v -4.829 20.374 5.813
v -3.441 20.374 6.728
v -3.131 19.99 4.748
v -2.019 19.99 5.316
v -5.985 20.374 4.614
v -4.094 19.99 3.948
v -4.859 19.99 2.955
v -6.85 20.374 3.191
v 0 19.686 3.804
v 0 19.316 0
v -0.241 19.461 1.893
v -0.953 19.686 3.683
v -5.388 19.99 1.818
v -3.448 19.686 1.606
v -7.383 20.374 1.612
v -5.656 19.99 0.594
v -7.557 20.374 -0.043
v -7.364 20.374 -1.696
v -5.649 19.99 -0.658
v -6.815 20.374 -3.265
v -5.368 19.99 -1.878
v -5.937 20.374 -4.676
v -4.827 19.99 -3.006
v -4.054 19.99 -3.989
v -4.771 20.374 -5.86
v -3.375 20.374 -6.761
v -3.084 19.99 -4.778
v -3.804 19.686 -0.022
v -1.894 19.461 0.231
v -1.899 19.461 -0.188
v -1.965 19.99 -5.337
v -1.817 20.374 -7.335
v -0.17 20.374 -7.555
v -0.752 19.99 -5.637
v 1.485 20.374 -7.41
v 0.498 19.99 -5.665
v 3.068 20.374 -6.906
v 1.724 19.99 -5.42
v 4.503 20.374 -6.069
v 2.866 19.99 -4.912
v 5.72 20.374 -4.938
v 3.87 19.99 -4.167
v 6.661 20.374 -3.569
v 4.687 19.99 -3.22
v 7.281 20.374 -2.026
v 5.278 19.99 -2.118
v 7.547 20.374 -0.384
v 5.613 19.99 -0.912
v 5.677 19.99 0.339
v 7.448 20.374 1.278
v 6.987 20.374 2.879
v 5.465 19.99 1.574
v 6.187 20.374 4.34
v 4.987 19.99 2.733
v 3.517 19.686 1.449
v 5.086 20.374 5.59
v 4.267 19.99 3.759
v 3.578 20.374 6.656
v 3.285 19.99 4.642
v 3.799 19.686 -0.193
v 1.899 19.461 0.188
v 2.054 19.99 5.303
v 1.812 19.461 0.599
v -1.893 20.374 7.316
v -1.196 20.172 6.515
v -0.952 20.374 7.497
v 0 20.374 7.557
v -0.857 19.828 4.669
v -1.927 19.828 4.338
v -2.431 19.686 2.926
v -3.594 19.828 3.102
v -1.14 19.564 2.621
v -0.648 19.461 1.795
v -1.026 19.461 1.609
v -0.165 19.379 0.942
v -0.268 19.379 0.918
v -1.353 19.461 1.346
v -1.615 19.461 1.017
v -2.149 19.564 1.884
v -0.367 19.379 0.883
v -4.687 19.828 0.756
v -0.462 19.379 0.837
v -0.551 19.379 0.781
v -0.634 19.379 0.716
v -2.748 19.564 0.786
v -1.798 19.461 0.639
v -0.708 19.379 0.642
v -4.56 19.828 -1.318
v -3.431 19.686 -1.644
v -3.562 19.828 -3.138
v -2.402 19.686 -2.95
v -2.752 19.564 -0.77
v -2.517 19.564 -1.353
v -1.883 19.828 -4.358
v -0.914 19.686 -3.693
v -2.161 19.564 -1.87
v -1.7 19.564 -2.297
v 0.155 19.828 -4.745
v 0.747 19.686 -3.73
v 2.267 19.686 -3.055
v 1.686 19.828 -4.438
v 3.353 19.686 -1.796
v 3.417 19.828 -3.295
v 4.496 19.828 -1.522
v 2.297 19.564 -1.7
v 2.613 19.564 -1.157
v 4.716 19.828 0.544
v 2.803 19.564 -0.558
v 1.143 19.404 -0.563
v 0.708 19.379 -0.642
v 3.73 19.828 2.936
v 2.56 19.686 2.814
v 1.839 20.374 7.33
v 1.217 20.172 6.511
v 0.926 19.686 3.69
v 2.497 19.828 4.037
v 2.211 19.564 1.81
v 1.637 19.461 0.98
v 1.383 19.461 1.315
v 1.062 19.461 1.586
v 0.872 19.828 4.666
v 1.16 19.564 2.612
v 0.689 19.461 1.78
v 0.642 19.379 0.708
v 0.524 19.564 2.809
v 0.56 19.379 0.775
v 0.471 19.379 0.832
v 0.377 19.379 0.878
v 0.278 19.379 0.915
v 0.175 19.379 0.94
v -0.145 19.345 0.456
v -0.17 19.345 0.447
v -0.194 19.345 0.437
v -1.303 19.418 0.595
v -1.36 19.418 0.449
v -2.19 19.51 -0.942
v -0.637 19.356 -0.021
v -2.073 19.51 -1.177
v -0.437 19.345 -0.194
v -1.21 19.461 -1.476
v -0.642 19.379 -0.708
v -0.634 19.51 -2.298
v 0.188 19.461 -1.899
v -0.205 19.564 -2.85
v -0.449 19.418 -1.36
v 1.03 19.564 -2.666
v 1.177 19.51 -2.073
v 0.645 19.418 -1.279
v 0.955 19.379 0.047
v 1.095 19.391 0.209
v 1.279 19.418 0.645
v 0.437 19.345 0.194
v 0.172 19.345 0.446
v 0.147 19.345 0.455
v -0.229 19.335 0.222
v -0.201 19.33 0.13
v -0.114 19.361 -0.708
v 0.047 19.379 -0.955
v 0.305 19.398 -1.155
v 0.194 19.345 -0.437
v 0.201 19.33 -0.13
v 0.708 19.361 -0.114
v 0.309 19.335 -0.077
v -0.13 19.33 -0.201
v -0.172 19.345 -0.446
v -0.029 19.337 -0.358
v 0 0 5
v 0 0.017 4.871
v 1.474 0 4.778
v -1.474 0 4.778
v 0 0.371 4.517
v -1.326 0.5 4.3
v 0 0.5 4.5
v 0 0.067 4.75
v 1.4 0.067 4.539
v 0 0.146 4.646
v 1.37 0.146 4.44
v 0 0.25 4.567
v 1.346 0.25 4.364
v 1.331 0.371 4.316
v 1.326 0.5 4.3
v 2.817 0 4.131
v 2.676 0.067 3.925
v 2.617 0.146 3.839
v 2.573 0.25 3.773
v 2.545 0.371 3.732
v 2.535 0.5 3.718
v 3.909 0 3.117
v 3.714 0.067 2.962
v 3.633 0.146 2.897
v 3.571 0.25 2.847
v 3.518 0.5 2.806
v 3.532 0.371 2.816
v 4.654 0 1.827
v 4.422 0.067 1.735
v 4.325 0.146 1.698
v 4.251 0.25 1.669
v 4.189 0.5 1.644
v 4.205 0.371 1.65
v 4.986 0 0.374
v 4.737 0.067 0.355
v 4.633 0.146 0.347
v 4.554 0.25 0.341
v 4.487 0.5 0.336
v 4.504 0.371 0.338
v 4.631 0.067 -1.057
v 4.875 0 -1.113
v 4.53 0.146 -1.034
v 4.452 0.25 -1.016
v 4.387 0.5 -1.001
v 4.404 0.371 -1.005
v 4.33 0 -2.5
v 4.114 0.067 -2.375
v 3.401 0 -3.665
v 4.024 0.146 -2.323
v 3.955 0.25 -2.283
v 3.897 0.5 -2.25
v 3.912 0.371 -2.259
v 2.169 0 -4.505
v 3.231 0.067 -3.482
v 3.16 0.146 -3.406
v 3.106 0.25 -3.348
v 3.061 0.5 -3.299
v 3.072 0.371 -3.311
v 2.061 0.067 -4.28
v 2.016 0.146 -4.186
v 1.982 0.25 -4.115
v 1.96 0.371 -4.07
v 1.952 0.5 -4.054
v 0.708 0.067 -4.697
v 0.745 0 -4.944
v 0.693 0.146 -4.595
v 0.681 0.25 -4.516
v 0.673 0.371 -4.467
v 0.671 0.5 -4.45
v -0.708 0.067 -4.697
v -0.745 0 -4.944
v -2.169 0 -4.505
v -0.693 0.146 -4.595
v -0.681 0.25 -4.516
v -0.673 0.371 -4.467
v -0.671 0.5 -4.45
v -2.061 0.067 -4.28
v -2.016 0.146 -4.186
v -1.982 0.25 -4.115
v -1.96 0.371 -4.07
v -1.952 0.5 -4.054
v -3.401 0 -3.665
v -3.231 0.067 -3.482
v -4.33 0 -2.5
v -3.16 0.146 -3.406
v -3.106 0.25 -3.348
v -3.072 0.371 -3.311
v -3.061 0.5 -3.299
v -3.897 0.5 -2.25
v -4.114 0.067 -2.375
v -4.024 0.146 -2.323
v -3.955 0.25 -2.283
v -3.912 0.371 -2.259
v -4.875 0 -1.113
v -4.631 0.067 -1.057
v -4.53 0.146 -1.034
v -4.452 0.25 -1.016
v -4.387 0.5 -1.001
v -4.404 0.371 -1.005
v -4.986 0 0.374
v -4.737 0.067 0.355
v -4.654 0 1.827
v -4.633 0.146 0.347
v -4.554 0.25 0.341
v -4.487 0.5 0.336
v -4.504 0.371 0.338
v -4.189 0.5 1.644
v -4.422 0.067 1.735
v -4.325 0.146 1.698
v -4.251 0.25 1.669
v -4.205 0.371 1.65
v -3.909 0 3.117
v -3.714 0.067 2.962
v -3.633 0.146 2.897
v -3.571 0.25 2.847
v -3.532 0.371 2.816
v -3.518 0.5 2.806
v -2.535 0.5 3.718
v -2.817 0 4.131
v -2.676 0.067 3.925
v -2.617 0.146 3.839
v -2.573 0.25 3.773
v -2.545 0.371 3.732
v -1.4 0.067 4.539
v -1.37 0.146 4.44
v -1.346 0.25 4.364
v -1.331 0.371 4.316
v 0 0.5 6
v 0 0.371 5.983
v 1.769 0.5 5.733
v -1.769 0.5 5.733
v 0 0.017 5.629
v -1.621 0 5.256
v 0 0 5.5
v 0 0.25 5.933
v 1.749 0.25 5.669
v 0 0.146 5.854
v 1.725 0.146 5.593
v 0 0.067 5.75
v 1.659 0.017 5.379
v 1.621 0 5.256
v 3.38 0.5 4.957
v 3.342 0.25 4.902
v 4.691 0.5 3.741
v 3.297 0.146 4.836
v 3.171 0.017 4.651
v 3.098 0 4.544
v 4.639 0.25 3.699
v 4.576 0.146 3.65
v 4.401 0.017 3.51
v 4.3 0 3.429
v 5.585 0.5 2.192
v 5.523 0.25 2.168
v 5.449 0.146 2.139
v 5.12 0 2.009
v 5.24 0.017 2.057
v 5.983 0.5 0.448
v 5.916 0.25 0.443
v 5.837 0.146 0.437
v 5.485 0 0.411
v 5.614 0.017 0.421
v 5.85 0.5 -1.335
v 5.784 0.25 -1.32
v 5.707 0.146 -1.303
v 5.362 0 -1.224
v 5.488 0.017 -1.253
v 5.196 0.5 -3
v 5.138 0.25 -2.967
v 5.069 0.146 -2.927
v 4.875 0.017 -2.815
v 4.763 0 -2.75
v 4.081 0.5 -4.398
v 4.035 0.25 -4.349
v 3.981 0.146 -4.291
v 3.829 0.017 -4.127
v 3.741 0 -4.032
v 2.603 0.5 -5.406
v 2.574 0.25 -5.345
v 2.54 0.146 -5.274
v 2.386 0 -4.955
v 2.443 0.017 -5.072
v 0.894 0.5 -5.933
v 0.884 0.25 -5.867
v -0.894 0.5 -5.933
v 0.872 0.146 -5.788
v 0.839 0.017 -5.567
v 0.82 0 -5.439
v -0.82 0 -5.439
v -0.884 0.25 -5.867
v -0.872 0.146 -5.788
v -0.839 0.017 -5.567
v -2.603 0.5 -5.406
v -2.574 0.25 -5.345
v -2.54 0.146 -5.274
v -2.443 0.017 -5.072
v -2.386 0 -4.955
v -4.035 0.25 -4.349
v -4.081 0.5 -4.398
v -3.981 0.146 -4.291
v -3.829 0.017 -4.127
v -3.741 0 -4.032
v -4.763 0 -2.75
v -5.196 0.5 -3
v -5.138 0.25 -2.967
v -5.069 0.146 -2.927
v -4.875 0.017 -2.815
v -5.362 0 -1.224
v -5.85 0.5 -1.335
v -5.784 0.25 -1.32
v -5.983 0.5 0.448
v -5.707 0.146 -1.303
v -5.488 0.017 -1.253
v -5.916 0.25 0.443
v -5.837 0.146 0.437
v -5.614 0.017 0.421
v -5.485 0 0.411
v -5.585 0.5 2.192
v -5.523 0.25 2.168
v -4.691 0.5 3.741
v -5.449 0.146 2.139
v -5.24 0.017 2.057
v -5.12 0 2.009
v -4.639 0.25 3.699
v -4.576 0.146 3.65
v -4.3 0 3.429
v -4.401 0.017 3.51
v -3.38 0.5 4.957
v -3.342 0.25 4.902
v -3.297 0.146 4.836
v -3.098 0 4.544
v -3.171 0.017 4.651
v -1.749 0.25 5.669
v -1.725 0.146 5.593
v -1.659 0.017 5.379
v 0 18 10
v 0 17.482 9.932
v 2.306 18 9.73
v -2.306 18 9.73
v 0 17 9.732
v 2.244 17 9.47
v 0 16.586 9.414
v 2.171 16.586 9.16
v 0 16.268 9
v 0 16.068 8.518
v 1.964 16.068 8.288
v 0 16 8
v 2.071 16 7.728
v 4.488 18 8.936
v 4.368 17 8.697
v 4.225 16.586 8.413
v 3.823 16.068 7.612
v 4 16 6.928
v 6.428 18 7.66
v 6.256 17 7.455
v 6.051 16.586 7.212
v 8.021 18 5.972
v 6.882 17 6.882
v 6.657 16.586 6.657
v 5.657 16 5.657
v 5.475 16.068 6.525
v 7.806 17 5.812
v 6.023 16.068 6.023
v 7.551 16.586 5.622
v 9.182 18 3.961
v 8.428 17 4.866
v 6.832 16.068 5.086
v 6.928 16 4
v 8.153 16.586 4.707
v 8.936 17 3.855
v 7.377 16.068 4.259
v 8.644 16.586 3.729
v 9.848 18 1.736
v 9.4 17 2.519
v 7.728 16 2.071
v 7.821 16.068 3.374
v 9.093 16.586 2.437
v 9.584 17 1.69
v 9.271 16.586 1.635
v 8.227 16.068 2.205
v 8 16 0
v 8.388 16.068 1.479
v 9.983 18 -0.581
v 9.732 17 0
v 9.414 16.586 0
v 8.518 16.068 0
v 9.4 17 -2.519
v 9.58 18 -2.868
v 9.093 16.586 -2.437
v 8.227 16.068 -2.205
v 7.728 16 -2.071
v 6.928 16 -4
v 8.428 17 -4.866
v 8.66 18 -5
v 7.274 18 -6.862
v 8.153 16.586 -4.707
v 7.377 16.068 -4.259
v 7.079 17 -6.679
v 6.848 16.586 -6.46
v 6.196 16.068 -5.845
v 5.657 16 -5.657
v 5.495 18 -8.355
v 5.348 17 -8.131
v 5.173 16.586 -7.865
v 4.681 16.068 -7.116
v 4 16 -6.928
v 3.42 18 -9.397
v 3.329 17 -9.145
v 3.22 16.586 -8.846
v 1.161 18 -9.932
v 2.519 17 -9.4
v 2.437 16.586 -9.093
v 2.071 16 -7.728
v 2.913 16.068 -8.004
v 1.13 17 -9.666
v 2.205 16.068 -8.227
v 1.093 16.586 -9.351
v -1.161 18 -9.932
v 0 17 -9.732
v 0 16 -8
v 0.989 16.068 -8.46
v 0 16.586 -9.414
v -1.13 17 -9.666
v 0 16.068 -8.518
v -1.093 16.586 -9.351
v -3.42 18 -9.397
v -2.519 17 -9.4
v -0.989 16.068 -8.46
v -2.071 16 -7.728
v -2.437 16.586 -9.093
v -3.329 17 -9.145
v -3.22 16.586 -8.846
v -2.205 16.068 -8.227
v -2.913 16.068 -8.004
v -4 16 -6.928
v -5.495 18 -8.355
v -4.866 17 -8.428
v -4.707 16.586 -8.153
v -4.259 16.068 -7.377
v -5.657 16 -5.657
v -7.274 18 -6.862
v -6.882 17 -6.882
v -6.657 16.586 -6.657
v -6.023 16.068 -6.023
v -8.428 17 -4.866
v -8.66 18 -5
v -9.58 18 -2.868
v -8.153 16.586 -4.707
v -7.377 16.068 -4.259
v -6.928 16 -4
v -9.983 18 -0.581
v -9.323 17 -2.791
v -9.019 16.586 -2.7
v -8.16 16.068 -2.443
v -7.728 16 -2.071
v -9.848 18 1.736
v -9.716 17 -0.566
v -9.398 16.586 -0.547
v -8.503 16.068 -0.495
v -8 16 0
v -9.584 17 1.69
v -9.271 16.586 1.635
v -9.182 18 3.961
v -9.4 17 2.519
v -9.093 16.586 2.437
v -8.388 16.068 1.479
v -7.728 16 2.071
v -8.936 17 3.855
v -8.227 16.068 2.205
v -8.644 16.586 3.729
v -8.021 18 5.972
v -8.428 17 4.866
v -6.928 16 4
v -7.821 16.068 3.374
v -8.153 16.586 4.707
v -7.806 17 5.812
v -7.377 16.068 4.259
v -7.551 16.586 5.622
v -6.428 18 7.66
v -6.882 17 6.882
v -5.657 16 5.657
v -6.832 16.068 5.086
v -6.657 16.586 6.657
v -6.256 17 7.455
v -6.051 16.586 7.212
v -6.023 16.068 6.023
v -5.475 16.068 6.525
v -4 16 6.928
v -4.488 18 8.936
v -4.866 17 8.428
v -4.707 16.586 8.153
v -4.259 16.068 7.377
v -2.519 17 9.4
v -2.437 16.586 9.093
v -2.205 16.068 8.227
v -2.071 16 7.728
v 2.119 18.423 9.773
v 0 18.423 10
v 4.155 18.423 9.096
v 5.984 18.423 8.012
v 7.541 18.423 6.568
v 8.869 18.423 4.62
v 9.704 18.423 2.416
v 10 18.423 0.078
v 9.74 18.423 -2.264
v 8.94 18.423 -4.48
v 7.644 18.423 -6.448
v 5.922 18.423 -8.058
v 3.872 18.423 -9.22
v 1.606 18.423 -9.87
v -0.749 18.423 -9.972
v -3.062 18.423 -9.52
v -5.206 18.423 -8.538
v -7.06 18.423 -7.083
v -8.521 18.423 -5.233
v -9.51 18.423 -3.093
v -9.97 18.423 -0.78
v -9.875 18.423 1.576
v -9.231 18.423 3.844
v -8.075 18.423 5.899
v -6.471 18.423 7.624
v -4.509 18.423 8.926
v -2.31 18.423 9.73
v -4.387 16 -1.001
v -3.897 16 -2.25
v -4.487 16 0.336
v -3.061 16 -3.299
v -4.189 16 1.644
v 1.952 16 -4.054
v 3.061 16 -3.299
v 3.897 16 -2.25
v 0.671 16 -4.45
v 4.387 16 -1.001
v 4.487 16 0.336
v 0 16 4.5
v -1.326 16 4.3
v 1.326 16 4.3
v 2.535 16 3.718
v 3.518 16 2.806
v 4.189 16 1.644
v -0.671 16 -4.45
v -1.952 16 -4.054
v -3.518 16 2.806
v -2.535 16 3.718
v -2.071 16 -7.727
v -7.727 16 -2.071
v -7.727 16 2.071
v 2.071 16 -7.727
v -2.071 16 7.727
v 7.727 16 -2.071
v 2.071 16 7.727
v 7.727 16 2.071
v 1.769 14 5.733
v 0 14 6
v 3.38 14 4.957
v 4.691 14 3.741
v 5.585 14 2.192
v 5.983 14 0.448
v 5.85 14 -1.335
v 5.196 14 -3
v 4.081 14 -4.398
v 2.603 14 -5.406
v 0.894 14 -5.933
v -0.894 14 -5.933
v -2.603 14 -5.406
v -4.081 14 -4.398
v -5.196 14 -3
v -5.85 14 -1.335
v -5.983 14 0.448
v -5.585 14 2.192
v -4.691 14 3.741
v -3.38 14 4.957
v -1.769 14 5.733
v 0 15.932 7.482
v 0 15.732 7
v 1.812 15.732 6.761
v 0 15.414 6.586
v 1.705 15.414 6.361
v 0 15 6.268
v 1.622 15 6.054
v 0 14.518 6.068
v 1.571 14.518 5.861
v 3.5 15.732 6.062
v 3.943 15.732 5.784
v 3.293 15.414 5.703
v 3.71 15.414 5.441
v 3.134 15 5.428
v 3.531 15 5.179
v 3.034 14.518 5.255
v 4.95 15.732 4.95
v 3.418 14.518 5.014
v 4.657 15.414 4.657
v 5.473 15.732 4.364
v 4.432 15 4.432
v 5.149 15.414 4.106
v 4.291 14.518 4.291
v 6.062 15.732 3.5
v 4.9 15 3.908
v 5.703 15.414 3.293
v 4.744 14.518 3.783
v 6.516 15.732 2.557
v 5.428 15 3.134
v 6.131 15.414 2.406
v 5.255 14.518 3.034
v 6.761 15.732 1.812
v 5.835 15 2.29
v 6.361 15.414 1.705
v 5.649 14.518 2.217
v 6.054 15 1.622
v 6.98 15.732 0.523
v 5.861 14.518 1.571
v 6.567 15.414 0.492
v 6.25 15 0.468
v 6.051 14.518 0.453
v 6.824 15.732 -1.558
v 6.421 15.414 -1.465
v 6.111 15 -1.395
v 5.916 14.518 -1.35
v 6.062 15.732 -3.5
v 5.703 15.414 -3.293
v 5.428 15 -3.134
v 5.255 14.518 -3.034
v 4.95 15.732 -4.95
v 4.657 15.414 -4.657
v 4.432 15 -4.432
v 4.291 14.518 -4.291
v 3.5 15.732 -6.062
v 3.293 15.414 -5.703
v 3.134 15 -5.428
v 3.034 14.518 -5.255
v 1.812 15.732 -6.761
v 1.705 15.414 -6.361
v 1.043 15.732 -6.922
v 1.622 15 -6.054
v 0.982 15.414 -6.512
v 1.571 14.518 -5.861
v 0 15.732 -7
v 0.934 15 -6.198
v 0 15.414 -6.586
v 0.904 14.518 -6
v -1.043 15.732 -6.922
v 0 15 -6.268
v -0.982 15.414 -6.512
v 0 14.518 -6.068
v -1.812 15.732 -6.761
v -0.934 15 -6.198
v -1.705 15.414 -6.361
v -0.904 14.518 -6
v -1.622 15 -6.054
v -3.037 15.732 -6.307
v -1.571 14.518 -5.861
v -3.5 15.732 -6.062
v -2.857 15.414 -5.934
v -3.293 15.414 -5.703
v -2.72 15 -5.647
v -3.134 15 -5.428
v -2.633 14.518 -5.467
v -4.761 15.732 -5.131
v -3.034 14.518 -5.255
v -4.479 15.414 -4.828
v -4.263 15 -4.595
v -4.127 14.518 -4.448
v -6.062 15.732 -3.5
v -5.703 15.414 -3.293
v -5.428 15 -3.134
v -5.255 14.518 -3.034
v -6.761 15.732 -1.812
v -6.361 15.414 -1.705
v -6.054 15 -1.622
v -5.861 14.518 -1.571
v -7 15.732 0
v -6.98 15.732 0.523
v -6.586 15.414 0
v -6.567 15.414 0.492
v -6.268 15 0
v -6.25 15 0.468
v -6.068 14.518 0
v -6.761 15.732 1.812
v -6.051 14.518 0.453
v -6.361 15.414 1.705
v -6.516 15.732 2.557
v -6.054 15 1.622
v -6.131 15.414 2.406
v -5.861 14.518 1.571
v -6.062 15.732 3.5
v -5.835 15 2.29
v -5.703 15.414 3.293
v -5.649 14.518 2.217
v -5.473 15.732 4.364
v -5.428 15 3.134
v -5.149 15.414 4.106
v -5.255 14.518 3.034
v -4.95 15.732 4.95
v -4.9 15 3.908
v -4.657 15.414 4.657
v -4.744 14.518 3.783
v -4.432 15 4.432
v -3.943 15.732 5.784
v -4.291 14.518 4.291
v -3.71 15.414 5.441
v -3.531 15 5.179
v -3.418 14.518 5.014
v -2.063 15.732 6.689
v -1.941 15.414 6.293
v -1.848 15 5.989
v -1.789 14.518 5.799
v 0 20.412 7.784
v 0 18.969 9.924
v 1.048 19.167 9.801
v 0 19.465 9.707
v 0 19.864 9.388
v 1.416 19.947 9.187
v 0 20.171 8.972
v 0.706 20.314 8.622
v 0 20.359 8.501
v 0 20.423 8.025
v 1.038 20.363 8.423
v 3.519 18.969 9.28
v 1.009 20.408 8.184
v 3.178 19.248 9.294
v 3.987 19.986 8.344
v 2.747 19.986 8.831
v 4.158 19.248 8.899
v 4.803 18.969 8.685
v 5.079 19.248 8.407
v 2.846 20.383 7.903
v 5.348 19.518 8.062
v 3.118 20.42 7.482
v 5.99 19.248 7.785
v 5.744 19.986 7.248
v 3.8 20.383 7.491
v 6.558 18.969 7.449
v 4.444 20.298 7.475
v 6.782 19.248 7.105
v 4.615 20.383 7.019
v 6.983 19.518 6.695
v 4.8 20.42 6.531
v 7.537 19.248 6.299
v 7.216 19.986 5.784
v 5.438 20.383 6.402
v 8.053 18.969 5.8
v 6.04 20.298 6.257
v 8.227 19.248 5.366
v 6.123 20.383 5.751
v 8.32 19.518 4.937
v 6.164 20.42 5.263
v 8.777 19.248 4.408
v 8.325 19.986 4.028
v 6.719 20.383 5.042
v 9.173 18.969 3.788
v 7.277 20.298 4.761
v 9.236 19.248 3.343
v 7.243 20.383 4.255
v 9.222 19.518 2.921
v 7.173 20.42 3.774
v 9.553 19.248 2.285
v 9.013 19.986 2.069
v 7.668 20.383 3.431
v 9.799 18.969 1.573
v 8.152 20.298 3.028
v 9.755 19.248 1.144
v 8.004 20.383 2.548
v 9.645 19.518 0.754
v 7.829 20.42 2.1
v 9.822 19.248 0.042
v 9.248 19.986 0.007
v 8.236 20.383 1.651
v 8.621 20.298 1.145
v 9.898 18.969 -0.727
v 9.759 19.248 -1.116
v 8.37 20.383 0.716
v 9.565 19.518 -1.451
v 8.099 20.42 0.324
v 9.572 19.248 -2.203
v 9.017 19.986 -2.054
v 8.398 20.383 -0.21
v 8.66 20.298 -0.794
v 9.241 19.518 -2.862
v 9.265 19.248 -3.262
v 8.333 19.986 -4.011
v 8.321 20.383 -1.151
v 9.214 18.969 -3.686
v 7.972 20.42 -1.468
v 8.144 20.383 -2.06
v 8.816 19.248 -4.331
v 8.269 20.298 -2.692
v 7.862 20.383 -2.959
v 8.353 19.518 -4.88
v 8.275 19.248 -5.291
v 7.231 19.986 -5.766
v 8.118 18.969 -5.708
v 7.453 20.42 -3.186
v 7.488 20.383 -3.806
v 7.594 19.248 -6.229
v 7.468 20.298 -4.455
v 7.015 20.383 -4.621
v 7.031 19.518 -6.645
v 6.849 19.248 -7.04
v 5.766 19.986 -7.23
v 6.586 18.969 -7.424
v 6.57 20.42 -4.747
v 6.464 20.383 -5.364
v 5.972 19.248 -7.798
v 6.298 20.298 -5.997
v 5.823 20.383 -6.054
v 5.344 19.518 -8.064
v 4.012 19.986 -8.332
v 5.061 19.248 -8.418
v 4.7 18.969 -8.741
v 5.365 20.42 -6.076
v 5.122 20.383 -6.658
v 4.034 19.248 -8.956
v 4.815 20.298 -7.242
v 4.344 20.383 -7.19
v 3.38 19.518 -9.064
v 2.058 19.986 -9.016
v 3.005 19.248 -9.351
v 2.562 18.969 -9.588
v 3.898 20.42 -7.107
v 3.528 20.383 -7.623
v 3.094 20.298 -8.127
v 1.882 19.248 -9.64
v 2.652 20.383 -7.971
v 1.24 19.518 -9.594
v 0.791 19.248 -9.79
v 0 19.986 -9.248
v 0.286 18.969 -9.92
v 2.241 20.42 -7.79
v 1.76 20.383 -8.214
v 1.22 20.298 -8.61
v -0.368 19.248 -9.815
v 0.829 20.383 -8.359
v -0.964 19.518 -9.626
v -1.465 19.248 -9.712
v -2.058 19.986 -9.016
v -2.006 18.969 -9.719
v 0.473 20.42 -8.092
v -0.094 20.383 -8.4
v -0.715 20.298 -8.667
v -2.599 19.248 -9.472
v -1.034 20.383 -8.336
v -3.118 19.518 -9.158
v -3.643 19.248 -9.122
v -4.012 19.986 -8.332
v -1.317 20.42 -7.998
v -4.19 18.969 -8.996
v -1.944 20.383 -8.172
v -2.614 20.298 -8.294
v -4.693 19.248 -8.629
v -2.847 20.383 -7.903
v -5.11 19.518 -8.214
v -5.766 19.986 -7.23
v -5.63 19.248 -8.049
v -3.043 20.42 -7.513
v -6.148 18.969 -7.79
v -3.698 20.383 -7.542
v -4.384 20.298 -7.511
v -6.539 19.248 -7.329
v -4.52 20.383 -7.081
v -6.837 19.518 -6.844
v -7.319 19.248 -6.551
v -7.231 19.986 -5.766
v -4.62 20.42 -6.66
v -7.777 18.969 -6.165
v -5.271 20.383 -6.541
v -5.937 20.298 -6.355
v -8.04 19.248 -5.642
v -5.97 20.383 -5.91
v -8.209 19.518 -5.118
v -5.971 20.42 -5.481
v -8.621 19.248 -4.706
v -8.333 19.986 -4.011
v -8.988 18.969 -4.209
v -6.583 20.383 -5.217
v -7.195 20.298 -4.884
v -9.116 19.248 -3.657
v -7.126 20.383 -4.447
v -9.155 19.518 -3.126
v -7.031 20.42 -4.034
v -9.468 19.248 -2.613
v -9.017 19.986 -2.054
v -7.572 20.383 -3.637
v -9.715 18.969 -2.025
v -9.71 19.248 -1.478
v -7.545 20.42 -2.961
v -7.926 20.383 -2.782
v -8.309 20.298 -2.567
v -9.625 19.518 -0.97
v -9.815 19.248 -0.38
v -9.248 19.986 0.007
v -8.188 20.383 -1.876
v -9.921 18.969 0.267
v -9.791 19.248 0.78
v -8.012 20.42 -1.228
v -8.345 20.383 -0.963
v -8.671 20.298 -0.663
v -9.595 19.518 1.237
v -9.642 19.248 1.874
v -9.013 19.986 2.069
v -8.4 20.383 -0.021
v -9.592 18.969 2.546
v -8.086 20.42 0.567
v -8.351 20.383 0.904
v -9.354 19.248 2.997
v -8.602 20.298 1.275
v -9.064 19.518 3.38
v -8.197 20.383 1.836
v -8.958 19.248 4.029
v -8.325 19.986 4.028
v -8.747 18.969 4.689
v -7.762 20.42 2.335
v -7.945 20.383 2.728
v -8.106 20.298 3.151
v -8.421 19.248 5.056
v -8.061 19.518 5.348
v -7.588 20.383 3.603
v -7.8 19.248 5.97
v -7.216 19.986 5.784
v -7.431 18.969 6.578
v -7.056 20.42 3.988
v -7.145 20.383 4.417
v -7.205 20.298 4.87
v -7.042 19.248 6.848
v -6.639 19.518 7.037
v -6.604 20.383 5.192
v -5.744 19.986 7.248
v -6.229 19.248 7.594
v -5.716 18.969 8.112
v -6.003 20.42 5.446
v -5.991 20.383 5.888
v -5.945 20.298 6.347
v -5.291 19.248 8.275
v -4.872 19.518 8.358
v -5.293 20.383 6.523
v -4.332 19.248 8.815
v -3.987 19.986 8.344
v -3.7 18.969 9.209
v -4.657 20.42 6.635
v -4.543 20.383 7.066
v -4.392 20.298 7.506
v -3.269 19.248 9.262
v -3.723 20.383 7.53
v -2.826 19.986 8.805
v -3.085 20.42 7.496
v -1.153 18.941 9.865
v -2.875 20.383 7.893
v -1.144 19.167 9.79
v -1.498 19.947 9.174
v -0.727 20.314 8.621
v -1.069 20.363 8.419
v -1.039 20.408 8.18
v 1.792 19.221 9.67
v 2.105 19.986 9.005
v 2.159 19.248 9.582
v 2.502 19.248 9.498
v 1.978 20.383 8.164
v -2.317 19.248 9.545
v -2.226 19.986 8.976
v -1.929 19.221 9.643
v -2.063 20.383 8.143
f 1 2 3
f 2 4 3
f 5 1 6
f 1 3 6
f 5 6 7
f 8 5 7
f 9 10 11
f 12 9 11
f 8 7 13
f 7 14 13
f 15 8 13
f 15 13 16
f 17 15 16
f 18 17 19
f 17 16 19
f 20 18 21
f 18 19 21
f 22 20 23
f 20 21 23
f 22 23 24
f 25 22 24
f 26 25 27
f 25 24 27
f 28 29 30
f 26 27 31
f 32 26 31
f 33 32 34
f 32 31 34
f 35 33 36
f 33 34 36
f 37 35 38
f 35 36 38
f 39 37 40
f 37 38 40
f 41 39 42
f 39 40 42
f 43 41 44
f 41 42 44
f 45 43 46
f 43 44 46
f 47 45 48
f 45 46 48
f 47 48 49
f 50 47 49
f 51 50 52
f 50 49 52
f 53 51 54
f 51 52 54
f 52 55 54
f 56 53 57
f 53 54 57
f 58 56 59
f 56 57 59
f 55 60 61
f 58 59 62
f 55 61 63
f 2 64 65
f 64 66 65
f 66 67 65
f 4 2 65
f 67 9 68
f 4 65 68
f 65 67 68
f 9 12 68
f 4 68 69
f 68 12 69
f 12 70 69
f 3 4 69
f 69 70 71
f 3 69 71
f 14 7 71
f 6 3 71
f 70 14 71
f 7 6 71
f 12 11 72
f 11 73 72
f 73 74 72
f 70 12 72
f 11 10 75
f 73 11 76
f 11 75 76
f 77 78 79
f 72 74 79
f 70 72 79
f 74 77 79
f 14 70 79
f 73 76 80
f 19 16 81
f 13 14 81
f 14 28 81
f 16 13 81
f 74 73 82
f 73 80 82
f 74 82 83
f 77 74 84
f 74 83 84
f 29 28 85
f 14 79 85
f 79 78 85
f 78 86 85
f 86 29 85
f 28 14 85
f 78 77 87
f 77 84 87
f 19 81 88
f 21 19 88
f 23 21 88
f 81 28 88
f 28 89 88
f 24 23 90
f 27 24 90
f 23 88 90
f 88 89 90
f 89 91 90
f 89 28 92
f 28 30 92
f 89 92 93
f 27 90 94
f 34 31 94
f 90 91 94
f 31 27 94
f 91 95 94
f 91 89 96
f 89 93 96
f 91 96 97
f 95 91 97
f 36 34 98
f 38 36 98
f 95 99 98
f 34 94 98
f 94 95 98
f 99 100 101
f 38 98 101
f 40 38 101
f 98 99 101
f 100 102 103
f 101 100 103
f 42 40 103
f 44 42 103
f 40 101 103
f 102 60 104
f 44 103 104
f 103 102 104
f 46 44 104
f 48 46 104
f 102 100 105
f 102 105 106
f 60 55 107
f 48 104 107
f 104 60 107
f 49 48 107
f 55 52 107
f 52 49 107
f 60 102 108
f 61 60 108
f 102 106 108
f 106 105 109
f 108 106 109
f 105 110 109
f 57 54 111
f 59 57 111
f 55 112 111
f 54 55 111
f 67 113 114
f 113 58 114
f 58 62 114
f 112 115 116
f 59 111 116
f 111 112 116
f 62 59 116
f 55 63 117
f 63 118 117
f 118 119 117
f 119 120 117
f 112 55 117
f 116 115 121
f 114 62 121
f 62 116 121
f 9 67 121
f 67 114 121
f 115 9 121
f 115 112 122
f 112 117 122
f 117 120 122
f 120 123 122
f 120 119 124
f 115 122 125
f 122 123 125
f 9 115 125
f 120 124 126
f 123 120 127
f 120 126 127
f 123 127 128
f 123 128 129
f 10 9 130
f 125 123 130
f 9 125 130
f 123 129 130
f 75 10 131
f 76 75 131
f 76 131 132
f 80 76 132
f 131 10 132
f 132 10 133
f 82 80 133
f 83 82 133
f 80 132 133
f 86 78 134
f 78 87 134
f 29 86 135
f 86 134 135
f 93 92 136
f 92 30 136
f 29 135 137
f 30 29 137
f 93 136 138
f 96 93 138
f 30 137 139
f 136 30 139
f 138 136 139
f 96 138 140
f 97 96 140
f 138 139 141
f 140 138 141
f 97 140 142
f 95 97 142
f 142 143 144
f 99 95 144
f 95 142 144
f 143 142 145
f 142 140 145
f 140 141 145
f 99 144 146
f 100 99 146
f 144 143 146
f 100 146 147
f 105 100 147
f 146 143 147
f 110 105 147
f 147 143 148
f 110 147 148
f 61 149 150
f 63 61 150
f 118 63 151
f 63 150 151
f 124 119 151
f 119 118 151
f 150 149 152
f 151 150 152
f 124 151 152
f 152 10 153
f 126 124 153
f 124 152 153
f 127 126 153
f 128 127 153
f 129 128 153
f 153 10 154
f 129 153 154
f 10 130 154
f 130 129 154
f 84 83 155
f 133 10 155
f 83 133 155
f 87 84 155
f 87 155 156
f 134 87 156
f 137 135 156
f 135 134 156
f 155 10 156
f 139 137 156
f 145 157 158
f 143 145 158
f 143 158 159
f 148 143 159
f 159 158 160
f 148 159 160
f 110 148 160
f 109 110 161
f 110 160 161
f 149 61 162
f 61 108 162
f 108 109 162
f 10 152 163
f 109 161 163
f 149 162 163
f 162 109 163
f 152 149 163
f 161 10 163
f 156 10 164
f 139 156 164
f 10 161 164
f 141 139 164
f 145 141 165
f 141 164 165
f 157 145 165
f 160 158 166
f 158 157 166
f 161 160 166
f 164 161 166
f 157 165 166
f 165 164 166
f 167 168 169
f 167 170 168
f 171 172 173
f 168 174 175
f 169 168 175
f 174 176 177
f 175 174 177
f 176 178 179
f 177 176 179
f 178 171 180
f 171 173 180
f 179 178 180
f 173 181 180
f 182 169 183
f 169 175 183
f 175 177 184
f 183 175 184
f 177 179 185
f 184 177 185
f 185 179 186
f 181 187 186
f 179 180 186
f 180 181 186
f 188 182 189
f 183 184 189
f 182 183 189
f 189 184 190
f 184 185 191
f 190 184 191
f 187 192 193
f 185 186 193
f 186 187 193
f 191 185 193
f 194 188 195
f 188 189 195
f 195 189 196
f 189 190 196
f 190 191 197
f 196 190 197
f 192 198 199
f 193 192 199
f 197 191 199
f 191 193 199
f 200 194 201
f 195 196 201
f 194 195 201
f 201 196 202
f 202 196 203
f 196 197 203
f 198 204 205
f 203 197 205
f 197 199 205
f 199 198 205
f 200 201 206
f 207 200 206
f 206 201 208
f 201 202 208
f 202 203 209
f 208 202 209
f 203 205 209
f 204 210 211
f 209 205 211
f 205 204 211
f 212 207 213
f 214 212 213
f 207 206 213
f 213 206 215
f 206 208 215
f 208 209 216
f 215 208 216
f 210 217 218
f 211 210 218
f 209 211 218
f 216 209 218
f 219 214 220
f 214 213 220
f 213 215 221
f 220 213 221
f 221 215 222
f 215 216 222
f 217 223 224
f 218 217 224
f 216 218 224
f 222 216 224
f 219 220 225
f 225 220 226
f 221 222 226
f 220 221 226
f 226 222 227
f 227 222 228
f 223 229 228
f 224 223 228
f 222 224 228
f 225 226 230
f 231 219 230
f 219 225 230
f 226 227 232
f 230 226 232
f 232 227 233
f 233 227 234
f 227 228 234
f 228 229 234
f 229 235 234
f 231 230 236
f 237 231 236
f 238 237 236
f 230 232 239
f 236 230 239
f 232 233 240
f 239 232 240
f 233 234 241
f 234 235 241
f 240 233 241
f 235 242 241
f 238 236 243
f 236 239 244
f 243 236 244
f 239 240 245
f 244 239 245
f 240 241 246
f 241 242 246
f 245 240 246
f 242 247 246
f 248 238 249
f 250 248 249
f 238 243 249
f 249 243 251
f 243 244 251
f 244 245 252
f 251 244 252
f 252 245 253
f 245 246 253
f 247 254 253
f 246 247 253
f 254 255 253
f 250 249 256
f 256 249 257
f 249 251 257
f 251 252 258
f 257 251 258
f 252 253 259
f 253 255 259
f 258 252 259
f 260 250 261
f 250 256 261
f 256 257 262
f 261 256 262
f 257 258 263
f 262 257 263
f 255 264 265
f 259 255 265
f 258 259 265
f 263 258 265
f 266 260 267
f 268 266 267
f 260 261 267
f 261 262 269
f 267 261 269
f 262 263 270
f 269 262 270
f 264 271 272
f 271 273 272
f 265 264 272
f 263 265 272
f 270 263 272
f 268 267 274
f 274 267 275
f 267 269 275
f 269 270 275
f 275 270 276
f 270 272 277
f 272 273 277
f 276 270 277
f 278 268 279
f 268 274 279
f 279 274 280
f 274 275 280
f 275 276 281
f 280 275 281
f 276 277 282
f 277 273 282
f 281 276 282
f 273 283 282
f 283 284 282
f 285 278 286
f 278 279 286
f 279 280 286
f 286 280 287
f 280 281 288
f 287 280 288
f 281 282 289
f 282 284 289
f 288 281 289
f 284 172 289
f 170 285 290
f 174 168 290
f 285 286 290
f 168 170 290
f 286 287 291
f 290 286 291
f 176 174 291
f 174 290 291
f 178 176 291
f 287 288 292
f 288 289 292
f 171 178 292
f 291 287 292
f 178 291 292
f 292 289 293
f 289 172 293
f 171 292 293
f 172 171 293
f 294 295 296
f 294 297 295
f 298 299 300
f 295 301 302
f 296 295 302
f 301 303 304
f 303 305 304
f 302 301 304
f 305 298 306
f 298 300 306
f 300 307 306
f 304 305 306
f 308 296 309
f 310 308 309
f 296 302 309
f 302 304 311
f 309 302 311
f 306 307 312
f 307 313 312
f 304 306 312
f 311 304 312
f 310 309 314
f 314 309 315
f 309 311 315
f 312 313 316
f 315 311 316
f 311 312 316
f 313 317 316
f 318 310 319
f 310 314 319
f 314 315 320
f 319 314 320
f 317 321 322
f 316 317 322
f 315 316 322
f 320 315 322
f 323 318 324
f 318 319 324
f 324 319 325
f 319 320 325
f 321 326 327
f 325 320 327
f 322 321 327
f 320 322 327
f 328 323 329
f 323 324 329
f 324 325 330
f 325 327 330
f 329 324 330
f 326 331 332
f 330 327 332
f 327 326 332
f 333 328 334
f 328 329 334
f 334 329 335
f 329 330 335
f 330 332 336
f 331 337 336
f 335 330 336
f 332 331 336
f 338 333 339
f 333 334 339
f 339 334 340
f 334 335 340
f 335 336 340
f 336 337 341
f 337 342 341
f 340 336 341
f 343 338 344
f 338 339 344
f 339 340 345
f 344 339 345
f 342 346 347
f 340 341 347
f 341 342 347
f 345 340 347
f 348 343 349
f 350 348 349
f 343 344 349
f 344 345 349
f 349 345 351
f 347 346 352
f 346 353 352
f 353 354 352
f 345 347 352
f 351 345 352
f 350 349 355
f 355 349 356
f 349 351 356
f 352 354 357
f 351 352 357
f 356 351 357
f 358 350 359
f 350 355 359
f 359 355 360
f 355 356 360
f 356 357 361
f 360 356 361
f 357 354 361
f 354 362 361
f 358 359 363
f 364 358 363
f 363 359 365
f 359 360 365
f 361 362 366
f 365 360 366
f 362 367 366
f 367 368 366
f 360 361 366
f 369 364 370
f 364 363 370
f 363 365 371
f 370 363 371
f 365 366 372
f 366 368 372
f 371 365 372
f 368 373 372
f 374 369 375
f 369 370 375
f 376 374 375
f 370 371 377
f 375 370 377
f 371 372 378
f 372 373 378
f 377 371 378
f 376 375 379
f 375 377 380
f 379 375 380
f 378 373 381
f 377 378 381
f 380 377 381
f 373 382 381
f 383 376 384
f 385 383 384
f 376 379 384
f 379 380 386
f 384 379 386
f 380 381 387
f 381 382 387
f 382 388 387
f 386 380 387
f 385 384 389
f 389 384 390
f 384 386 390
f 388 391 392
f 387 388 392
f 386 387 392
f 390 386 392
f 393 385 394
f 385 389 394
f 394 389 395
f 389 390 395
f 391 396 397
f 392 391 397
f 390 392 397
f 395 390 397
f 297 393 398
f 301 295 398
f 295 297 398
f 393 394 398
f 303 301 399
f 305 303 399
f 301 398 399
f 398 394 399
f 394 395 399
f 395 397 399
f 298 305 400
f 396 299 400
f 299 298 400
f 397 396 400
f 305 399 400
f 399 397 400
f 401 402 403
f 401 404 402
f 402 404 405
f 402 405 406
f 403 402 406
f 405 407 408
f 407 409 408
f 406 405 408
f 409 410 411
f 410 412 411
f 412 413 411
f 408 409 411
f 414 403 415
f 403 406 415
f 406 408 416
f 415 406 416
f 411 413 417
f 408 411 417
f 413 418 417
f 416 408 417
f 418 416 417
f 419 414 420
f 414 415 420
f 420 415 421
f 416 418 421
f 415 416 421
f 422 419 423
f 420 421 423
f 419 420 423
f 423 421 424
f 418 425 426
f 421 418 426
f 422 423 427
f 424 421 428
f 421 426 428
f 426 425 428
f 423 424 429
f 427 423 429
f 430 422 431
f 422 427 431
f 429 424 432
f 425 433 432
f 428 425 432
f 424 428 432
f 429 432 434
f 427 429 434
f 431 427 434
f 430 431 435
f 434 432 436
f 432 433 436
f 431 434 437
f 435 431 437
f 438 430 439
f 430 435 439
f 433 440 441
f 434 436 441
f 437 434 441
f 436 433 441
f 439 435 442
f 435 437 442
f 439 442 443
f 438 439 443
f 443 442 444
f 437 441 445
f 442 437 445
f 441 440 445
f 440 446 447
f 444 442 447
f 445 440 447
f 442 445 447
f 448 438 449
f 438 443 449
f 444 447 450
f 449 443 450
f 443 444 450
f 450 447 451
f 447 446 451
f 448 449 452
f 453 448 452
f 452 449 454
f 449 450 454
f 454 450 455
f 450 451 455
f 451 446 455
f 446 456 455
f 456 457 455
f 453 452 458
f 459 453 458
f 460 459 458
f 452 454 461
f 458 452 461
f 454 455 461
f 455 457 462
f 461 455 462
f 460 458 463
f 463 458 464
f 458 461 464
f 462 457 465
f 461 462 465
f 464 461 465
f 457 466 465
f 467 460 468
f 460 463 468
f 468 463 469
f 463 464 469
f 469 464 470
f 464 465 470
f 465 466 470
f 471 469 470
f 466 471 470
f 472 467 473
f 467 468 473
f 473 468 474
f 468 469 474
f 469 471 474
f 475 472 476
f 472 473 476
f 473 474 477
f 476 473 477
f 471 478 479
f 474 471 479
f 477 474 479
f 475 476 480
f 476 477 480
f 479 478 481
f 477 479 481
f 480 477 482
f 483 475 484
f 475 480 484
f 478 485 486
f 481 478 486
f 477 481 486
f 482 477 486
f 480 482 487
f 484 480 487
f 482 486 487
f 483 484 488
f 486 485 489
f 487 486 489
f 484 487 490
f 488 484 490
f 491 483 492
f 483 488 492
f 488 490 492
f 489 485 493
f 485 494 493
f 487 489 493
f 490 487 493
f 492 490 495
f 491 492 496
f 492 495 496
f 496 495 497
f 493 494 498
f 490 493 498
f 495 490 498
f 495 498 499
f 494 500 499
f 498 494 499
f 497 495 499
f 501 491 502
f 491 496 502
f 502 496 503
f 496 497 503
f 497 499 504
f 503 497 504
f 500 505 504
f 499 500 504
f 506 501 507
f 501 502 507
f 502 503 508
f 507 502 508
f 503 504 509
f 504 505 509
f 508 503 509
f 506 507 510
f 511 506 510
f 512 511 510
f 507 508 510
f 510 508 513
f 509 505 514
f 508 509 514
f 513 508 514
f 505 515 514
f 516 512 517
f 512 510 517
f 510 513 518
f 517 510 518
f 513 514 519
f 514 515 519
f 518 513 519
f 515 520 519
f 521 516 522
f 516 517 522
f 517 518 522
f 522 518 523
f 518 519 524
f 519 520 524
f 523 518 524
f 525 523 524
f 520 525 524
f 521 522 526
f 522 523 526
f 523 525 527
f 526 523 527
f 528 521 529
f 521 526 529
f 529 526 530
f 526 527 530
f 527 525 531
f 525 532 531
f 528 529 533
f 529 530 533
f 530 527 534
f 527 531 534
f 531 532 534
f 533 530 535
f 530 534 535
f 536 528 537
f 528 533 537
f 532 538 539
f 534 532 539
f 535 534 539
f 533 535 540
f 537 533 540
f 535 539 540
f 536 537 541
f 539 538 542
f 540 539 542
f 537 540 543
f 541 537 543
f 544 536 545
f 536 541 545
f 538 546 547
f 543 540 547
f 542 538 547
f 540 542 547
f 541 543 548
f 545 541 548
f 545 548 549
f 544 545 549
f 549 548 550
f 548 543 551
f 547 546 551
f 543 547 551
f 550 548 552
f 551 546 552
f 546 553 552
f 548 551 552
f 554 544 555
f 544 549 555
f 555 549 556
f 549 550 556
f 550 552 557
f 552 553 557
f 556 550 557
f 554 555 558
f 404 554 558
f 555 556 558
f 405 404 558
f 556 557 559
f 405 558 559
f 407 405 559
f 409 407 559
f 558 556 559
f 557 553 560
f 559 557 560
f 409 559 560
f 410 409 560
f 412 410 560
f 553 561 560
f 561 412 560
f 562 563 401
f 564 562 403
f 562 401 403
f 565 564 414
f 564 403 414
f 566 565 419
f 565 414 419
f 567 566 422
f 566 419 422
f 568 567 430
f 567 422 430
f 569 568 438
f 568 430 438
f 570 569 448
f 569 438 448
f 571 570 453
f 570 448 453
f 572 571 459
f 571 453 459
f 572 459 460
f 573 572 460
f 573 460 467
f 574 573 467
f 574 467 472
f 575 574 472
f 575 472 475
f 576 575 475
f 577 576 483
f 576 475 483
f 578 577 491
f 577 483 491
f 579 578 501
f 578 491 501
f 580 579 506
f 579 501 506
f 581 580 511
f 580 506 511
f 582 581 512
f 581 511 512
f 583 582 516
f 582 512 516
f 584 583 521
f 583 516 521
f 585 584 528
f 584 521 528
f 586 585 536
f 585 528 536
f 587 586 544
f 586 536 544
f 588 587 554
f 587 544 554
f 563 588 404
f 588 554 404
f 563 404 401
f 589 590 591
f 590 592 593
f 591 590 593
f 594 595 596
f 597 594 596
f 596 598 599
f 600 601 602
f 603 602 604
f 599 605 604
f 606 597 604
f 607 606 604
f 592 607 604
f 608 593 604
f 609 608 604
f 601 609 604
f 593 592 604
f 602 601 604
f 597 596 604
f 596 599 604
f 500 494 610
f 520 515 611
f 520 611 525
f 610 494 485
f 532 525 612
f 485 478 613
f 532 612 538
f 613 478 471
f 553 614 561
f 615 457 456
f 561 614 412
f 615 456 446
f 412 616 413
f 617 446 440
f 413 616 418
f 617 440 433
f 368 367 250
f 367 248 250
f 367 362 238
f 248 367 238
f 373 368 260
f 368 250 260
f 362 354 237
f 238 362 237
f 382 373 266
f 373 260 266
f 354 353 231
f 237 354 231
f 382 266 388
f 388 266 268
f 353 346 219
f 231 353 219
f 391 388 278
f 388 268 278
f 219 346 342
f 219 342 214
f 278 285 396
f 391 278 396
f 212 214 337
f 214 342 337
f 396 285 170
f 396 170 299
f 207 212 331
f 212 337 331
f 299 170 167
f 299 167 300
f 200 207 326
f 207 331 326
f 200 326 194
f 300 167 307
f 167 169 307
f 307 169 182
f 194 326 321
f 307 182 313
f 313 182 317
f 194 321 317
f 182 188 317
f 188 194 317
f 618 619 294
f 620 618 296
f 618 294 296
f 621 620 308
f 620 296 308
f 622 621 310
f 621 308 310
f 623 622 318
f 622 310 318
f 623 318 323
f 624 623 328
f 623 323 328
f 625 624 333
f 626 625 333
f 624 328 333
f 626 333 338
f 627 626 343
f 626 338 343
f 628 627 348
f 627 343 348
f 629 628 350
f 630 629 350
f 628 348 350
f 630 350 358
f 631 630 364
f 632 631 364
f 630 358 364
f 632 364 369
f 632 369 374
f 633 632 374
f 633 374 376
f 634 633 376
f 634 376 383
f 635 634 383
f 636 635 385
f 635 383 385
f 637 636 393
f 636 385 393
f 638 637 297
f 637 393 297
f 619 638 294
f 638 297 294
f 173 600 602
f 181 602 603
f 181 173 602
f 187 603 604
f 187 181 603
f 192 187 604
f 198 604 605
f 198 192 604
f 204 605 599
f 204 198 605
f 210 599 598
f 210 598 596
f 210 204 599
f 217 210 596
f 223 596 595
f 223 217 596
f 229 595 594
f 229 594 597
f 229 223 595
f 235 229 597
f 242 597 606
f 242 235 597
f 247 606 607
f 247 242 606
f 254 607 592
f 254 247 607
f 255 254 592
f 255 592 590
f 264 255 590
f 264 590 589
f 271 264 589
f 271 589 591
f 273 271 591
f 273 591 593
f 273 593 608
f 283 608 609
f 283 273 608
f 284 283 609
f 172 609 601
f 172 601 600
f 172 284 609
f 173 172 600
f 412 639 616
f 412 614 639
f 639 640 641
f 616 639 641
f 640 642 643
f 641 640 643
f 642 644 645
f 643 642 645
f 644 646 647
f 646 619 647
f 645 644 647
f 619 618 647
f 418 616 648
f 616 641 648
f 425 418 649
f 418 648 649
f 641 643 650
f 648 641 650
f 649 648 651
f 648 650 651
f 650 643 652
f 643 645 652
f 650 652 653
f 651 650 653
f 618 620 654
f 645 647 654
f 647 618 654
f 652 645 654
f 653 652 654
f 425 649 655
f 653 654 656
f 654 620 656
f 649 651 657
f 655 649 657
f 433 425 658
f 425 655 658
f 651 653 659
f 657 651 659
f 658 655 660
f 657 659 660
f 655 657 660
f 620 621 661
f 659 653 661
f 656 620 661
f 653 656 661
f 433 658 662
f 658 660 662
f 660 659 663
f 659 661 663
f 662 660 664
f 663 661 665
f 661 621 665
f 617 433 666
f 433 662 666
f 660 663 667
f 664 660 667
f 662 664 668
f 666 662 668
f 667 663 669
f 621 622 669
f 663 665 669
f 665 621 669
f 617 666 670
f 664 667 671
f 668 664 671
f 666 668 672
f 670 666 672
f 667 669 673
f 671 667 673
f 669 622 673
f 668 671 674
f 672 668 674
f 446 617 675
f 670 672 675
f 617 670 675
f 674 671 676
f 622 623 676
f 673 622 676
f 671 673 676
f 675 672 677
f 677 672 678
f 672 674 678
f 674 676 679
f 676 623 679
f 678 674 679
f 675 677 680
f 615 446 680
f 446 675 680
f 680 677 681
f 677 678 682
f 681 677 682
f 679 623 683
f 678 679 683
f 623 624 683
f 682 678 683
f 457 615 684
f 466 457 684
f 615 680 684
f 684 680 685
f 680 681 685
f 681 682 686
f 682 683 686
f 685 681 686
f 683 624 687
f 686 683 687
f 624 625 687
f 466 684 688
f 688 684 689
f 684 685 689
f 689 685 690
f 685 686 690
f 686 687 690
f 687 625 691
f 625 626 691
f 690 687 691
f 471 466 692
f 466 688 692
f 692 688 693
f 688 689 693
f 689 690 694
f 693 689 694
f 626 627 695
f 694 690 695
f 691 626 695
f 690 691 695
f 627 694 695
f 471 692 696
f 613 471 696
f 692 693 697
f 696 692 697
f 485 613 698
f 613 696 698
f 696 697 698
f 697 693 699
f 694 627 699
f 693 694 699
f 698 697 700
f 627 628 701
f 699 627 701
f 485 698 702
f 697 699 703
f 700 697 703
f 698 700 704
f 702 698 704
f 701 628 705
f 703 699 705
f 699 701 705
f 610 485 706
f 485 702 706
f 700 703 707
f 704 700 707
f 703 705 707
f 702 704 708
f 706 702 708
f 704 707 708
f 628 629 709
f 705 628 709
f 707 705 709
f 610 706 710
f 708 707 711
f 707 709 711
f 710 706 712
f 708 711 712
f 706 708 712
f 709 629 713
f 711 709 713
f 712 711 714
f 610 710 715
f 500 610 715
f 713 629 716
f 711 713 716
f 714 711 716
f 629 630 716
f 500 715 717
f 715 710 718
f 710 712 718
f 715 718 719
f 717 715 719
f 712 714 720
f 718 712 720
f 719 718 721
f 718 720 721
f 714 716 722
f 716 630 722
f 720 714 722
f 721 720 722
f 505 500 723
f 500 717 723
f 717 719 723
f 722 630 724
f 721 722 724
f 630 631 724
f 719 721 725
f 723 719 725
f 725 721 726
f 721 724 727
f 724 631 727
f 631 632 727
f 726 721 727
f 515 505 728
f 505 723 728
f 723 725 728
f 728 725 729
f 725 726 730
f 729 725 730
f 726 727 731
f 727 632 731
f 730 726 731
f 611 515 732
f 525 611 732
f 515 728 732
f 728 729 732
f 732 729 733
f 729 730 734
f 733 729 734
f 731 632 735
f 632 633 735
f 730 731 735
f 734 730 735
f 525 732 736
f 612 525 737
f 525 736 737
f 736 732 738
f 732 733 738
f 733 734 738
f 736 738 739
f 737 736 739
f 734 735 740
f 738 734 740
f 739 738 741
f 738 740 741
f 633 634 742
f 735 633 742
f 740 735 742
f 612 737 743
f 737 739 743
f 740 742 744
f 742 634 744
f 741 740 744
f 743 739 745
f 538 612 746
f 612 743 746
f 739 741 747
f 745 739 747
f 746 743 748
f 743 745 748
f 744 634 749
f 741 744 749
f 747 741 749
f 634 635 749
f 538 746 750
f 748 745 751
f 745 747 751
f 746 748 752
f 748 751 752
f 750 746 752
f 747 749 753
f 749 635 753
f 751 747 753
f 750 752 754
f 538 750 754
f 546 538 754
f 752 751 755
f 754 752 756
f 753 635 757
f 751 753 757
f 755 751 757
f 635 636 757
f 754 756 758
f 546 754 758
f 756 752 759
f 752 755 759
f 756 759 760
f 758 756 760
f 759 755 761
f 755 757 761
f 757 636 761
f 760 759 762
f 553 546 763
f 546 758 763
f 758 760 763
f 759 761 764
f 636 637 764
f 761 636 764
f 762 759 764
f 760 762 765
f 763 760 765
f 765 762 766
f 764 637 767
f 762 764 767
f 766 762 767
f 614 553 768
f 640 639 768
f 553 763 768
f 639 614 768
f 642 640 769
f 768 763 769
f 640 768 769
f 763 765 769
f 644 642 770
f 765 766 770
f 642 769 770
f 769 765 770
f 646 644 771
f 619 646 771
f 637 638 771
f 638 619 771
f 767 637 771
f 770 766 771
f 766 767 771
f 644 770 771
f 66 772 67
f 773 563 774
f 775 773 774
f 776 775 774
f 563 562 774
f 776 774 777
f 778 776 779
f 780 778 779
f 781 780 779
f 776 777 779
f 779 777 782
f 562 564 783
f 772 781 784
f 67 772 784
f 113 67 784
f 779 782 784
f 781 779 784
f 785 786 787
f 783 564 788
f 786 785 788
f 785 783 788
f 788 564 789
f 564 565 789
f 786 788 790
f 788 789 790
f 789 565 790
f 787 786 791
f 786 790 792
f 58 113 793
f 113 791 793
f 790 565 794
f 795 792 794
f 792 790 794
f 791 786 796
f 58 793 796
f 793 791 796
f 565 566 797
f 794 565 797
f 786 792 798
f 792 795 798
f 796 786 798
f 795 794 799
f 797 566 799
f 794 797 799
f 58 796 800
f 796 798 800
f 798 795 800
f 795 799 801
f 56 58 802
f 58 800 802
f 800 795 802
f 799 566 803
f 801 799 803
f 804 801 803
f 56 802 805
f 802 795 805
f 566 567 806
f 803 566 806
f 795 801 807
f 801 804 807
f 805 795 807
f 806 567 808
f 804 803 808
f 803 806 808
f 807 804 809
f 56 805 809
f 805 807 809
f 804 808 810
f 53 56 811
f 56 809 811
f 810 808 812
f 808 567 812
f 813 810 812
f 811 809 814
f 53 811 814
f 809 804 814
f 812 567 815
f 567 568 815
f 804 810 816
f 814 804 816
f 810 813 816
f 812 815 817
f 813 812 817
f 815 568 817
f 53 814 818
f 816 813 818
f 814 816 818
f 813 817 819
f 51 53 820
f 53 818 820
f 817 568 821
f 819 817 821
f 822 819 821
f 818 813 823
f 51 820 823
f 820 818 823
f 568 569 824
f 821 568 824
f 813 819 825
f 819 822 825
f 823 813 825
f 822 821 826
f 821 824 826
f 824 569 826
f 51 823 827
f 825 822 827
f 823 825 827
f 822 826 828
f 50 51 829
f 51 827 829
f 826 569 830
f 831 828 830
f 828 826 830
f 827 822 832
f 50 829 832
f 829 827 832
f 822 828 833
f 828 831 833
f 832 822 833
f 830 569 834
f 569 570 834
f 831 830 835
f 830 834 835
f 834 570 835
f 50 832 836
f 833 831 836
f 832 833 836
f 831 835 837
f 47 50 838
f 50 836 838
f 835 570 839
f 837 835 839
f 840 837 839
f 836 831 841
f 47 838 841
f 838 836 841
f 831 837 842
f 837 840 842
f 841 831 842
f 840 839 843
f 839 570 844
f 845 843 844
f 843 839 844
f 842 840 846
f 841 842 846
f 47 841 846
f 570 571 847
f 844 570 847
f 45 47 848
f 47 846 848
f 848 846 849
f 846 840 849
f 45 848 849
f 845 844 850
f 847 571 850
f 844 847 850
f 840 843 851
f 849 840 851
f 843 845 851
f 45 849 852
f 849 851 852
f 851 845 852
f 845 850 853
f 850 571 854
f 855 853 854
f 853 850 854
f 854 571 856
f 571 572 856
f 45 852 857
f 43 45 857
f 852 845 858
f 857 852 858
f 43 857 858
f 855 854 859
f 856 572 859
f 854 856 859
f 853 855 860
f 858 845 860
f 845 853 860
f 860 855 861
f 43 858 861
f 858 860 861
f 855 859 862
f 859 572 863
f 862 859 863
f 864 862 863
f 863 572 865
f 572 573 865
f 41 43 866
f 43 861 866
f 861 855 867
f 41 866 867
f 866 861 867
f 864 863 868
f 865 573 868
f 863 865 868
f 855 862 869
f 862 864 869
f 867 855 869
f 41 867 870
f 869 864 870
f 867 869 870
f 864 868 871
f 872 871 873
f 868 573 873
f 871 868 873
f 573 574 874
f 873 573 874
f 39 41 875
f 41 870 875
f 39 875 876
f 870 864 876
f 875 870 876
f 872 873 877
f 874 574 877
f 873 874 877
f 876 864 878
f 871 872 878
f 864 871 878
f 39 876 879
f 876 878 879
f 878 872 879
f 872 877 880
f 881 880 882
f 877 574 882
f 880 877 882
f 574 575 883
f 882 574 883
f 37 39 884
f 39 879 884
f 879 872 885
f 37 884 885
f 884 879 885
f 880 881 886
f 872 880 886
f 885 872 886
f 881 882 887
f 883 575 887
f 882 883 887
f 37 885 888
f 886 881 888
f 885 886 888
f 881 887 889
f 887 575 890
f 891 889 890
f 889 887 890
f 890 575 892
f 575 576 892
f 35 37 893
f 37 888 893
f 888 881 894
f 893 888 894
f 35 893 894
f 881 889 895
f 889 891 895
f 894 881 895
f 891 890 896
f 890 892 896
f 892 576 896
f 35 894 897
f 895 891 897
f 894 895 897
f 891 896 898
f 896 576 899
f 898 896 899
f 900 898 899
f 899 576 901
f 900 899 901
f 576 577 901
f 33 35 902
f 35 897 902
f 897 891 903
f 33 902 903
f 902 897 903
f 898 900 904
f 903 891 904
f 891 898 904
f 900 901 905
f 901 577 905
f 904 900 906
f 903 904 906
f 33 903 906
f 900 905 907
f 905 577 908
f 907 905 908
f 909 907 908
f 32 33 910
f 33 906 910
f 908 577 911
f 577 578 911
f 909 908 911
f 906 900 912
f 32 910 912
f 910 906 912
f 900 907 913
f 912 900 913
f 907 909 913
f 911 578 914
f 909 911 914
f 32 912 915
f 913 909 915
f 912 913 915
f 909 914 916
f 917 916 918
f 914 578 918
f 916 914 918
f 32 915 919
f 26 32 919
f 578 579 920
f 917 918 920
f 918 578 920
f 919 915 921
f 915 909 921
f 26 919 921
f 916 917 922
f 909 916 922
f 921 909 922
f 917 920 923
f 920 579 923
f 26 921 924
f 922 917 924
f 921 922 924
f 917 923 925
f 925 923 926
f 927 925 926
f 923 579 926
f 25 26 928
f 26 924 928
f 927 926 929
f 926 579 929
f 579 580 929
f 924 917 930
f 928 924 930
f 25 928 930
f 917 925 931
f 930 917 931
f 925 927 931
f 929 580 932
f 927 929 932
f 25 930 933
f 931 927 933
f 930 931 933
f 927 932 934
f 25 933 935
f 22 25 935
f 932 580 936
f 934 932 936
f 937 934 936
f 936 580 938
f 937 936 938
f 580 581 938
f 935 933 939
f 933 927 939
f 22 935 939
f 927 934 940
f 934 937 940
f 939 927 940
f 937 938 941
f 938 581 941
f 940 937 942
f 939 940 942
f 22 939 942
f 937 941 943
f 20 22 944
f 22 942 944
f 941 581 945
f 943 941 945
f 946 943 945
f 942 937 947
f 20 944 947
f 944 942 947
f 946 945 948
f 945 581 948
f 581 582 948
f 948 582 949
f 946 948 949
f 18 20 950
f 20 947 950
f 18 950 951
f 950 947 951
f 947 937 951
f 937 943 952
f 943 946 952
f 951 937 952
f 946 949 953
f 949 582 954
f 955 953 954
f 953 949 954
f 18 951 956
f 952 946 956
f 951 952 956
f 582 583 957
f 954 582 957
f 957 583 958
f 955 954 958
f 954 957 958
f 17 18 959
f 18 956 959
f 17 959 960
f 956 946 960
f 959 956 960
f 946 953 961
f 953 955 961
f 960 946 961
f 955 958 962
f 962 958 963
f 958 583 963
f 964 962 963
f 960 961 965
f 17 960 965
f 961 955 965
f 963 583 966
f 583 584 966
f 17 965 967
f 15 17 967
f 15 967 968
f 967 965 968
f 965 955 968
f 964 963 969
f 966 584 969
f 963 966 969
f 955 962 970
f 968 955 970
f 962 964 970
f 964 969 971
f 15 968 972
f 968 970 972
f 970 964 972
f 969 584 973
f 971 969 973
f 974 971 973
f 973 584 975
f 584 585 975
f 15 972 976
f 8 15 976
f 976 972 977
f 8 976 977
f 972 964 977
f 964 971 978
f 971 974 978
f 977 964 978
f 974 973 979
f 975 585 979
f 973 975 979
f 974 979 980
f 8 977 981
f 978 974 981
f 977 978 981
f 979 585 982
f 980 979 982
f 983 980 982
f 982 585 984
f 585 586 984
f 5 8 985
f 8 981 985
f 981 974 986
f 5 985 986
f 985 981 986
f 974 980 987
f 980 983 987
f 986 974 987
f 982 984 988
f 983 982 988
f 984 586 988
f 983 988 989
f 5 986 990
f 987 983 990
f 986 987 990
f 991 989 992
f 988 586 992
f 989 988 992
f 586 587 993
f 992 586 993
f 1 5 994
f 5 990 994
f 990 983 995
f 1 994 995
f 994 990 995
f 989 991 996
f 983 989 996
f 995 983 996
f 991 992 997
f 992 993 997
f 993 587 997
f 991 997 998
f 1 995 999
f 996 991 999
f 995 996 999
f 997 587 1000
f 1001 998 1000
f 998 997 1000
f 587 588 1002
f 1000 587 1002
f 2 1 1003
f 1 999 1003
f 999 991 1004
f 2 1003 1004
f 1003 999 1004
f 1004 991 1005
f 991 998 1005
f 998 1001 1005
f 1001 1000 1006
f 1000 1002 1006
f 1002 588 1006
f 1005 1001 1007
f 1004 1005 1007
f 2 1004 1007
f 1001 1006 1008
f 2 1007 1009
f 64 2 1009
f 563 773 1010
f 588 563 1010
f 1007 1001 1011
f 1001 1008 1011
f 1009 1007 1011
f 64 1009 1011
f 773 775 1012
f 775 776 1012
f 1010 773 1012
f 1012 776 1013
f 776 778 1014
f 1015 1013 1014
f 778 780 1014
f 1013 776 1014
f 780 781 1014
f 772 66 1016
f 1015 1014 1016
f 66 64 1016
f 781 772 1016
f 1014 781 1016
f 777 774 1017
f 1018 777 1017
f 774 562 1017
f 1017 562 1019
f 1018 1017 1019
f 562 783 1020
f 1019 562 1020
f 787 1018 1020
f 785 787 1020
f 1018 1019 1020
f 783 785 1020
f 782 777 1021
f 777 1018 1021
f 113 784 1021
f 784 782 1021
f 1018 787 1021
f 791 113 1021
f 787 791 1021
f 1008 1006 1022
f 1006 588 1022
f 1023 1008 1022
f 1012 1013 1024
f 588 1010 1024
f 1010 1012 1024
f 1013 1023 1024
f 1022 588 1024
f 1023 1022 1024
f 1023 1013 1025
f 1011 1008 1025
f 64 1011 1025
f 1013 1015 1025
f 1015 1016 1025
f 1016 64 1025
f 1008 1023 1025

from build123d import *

# Parameters (mm, degrees)
SKETCH_1_R      = 6
SKETCH_1_R_2    = 4.5
EXTRUDE_1_DEPTH = 16
SKETCH_2_R      = 10
EXTRUDE_2_DEPTH = 5
FILLET_1_R      = 2
FILLET_2_R      = 0.5


with BuildPart() as part:
    # 草圖1 → 填料-伸長1 (new body)
    with BuildSketch(Plane(origin=(0, 0, 0), x_dir=(1, 0, 0), z_dir=(0, 1, 0))):
        with Locations(Location((0, 0, 0), (0, 0, 270))):
            Circle(SKETCH_1_R)
        with Locations(Location((0, 0, 0), (0, 0, 270))):
            Circle(SKETCH_1_R_2, mode=Mode.SUBTRACT)
    extrude(amount=EXTRUDE_1_DEPTH)

    # 草圖2 → 填料-伸長2 (add)
    with BuildSketch(Plane(origin=(0, 16, 0), x_dir=(1, 0, 0), z_dir=(0, 1, 0))):
        with Locations(Location((0, 0, 0), (0, 0, 270))):
            Circle(SKETCH_2_R)
    extrude(amount=EXTRUDE_2_DEPTH)

    # 草圖3 → 除料-旋轉1 (revolve, cut)
    with BuildSketch(Plane(origin=(0, 0, 0), x_dir=(0, 0, -1), z_dir=(1, 0, 0))):
        with BuildLine():
            Line((0, 21), (0, 19.316289144))
            add(Edge.make_bspline(
                [(-10, 21), (-5.090329438, 19.596139372), (0, 19.316289144)],
                knots=[0, 0, 0, 1, 1, 1], degree=2))
            Line((-10, 21), (0, 21))
        make_face()
    revolve(axis=Axis((0, 21, 0), (0, -1, 0)), mode=Mode.SUBTRACT)

    # 圓角1
    fillet_1_edges = [part.edges().sort_by_distance(p)[0] for p in [
        (0, 21, -10),
        (0, 16, -6),
        (0, 16, -10),
    ]]
    fillet(fillet_1_edges, radius=FILLET_1_R - 0.0001)  # a hair under: the kernel refuses the full size

    # 圓角2
    fillet_2_edges = [part.edges().sort_by_distance(p)[0] for p in [
        (0, 0, -6),
        (0, 0, -4.5),
    ]]
    fillet(fillet_2_edges, radius=FILLET_2_R)


solid = part.part
